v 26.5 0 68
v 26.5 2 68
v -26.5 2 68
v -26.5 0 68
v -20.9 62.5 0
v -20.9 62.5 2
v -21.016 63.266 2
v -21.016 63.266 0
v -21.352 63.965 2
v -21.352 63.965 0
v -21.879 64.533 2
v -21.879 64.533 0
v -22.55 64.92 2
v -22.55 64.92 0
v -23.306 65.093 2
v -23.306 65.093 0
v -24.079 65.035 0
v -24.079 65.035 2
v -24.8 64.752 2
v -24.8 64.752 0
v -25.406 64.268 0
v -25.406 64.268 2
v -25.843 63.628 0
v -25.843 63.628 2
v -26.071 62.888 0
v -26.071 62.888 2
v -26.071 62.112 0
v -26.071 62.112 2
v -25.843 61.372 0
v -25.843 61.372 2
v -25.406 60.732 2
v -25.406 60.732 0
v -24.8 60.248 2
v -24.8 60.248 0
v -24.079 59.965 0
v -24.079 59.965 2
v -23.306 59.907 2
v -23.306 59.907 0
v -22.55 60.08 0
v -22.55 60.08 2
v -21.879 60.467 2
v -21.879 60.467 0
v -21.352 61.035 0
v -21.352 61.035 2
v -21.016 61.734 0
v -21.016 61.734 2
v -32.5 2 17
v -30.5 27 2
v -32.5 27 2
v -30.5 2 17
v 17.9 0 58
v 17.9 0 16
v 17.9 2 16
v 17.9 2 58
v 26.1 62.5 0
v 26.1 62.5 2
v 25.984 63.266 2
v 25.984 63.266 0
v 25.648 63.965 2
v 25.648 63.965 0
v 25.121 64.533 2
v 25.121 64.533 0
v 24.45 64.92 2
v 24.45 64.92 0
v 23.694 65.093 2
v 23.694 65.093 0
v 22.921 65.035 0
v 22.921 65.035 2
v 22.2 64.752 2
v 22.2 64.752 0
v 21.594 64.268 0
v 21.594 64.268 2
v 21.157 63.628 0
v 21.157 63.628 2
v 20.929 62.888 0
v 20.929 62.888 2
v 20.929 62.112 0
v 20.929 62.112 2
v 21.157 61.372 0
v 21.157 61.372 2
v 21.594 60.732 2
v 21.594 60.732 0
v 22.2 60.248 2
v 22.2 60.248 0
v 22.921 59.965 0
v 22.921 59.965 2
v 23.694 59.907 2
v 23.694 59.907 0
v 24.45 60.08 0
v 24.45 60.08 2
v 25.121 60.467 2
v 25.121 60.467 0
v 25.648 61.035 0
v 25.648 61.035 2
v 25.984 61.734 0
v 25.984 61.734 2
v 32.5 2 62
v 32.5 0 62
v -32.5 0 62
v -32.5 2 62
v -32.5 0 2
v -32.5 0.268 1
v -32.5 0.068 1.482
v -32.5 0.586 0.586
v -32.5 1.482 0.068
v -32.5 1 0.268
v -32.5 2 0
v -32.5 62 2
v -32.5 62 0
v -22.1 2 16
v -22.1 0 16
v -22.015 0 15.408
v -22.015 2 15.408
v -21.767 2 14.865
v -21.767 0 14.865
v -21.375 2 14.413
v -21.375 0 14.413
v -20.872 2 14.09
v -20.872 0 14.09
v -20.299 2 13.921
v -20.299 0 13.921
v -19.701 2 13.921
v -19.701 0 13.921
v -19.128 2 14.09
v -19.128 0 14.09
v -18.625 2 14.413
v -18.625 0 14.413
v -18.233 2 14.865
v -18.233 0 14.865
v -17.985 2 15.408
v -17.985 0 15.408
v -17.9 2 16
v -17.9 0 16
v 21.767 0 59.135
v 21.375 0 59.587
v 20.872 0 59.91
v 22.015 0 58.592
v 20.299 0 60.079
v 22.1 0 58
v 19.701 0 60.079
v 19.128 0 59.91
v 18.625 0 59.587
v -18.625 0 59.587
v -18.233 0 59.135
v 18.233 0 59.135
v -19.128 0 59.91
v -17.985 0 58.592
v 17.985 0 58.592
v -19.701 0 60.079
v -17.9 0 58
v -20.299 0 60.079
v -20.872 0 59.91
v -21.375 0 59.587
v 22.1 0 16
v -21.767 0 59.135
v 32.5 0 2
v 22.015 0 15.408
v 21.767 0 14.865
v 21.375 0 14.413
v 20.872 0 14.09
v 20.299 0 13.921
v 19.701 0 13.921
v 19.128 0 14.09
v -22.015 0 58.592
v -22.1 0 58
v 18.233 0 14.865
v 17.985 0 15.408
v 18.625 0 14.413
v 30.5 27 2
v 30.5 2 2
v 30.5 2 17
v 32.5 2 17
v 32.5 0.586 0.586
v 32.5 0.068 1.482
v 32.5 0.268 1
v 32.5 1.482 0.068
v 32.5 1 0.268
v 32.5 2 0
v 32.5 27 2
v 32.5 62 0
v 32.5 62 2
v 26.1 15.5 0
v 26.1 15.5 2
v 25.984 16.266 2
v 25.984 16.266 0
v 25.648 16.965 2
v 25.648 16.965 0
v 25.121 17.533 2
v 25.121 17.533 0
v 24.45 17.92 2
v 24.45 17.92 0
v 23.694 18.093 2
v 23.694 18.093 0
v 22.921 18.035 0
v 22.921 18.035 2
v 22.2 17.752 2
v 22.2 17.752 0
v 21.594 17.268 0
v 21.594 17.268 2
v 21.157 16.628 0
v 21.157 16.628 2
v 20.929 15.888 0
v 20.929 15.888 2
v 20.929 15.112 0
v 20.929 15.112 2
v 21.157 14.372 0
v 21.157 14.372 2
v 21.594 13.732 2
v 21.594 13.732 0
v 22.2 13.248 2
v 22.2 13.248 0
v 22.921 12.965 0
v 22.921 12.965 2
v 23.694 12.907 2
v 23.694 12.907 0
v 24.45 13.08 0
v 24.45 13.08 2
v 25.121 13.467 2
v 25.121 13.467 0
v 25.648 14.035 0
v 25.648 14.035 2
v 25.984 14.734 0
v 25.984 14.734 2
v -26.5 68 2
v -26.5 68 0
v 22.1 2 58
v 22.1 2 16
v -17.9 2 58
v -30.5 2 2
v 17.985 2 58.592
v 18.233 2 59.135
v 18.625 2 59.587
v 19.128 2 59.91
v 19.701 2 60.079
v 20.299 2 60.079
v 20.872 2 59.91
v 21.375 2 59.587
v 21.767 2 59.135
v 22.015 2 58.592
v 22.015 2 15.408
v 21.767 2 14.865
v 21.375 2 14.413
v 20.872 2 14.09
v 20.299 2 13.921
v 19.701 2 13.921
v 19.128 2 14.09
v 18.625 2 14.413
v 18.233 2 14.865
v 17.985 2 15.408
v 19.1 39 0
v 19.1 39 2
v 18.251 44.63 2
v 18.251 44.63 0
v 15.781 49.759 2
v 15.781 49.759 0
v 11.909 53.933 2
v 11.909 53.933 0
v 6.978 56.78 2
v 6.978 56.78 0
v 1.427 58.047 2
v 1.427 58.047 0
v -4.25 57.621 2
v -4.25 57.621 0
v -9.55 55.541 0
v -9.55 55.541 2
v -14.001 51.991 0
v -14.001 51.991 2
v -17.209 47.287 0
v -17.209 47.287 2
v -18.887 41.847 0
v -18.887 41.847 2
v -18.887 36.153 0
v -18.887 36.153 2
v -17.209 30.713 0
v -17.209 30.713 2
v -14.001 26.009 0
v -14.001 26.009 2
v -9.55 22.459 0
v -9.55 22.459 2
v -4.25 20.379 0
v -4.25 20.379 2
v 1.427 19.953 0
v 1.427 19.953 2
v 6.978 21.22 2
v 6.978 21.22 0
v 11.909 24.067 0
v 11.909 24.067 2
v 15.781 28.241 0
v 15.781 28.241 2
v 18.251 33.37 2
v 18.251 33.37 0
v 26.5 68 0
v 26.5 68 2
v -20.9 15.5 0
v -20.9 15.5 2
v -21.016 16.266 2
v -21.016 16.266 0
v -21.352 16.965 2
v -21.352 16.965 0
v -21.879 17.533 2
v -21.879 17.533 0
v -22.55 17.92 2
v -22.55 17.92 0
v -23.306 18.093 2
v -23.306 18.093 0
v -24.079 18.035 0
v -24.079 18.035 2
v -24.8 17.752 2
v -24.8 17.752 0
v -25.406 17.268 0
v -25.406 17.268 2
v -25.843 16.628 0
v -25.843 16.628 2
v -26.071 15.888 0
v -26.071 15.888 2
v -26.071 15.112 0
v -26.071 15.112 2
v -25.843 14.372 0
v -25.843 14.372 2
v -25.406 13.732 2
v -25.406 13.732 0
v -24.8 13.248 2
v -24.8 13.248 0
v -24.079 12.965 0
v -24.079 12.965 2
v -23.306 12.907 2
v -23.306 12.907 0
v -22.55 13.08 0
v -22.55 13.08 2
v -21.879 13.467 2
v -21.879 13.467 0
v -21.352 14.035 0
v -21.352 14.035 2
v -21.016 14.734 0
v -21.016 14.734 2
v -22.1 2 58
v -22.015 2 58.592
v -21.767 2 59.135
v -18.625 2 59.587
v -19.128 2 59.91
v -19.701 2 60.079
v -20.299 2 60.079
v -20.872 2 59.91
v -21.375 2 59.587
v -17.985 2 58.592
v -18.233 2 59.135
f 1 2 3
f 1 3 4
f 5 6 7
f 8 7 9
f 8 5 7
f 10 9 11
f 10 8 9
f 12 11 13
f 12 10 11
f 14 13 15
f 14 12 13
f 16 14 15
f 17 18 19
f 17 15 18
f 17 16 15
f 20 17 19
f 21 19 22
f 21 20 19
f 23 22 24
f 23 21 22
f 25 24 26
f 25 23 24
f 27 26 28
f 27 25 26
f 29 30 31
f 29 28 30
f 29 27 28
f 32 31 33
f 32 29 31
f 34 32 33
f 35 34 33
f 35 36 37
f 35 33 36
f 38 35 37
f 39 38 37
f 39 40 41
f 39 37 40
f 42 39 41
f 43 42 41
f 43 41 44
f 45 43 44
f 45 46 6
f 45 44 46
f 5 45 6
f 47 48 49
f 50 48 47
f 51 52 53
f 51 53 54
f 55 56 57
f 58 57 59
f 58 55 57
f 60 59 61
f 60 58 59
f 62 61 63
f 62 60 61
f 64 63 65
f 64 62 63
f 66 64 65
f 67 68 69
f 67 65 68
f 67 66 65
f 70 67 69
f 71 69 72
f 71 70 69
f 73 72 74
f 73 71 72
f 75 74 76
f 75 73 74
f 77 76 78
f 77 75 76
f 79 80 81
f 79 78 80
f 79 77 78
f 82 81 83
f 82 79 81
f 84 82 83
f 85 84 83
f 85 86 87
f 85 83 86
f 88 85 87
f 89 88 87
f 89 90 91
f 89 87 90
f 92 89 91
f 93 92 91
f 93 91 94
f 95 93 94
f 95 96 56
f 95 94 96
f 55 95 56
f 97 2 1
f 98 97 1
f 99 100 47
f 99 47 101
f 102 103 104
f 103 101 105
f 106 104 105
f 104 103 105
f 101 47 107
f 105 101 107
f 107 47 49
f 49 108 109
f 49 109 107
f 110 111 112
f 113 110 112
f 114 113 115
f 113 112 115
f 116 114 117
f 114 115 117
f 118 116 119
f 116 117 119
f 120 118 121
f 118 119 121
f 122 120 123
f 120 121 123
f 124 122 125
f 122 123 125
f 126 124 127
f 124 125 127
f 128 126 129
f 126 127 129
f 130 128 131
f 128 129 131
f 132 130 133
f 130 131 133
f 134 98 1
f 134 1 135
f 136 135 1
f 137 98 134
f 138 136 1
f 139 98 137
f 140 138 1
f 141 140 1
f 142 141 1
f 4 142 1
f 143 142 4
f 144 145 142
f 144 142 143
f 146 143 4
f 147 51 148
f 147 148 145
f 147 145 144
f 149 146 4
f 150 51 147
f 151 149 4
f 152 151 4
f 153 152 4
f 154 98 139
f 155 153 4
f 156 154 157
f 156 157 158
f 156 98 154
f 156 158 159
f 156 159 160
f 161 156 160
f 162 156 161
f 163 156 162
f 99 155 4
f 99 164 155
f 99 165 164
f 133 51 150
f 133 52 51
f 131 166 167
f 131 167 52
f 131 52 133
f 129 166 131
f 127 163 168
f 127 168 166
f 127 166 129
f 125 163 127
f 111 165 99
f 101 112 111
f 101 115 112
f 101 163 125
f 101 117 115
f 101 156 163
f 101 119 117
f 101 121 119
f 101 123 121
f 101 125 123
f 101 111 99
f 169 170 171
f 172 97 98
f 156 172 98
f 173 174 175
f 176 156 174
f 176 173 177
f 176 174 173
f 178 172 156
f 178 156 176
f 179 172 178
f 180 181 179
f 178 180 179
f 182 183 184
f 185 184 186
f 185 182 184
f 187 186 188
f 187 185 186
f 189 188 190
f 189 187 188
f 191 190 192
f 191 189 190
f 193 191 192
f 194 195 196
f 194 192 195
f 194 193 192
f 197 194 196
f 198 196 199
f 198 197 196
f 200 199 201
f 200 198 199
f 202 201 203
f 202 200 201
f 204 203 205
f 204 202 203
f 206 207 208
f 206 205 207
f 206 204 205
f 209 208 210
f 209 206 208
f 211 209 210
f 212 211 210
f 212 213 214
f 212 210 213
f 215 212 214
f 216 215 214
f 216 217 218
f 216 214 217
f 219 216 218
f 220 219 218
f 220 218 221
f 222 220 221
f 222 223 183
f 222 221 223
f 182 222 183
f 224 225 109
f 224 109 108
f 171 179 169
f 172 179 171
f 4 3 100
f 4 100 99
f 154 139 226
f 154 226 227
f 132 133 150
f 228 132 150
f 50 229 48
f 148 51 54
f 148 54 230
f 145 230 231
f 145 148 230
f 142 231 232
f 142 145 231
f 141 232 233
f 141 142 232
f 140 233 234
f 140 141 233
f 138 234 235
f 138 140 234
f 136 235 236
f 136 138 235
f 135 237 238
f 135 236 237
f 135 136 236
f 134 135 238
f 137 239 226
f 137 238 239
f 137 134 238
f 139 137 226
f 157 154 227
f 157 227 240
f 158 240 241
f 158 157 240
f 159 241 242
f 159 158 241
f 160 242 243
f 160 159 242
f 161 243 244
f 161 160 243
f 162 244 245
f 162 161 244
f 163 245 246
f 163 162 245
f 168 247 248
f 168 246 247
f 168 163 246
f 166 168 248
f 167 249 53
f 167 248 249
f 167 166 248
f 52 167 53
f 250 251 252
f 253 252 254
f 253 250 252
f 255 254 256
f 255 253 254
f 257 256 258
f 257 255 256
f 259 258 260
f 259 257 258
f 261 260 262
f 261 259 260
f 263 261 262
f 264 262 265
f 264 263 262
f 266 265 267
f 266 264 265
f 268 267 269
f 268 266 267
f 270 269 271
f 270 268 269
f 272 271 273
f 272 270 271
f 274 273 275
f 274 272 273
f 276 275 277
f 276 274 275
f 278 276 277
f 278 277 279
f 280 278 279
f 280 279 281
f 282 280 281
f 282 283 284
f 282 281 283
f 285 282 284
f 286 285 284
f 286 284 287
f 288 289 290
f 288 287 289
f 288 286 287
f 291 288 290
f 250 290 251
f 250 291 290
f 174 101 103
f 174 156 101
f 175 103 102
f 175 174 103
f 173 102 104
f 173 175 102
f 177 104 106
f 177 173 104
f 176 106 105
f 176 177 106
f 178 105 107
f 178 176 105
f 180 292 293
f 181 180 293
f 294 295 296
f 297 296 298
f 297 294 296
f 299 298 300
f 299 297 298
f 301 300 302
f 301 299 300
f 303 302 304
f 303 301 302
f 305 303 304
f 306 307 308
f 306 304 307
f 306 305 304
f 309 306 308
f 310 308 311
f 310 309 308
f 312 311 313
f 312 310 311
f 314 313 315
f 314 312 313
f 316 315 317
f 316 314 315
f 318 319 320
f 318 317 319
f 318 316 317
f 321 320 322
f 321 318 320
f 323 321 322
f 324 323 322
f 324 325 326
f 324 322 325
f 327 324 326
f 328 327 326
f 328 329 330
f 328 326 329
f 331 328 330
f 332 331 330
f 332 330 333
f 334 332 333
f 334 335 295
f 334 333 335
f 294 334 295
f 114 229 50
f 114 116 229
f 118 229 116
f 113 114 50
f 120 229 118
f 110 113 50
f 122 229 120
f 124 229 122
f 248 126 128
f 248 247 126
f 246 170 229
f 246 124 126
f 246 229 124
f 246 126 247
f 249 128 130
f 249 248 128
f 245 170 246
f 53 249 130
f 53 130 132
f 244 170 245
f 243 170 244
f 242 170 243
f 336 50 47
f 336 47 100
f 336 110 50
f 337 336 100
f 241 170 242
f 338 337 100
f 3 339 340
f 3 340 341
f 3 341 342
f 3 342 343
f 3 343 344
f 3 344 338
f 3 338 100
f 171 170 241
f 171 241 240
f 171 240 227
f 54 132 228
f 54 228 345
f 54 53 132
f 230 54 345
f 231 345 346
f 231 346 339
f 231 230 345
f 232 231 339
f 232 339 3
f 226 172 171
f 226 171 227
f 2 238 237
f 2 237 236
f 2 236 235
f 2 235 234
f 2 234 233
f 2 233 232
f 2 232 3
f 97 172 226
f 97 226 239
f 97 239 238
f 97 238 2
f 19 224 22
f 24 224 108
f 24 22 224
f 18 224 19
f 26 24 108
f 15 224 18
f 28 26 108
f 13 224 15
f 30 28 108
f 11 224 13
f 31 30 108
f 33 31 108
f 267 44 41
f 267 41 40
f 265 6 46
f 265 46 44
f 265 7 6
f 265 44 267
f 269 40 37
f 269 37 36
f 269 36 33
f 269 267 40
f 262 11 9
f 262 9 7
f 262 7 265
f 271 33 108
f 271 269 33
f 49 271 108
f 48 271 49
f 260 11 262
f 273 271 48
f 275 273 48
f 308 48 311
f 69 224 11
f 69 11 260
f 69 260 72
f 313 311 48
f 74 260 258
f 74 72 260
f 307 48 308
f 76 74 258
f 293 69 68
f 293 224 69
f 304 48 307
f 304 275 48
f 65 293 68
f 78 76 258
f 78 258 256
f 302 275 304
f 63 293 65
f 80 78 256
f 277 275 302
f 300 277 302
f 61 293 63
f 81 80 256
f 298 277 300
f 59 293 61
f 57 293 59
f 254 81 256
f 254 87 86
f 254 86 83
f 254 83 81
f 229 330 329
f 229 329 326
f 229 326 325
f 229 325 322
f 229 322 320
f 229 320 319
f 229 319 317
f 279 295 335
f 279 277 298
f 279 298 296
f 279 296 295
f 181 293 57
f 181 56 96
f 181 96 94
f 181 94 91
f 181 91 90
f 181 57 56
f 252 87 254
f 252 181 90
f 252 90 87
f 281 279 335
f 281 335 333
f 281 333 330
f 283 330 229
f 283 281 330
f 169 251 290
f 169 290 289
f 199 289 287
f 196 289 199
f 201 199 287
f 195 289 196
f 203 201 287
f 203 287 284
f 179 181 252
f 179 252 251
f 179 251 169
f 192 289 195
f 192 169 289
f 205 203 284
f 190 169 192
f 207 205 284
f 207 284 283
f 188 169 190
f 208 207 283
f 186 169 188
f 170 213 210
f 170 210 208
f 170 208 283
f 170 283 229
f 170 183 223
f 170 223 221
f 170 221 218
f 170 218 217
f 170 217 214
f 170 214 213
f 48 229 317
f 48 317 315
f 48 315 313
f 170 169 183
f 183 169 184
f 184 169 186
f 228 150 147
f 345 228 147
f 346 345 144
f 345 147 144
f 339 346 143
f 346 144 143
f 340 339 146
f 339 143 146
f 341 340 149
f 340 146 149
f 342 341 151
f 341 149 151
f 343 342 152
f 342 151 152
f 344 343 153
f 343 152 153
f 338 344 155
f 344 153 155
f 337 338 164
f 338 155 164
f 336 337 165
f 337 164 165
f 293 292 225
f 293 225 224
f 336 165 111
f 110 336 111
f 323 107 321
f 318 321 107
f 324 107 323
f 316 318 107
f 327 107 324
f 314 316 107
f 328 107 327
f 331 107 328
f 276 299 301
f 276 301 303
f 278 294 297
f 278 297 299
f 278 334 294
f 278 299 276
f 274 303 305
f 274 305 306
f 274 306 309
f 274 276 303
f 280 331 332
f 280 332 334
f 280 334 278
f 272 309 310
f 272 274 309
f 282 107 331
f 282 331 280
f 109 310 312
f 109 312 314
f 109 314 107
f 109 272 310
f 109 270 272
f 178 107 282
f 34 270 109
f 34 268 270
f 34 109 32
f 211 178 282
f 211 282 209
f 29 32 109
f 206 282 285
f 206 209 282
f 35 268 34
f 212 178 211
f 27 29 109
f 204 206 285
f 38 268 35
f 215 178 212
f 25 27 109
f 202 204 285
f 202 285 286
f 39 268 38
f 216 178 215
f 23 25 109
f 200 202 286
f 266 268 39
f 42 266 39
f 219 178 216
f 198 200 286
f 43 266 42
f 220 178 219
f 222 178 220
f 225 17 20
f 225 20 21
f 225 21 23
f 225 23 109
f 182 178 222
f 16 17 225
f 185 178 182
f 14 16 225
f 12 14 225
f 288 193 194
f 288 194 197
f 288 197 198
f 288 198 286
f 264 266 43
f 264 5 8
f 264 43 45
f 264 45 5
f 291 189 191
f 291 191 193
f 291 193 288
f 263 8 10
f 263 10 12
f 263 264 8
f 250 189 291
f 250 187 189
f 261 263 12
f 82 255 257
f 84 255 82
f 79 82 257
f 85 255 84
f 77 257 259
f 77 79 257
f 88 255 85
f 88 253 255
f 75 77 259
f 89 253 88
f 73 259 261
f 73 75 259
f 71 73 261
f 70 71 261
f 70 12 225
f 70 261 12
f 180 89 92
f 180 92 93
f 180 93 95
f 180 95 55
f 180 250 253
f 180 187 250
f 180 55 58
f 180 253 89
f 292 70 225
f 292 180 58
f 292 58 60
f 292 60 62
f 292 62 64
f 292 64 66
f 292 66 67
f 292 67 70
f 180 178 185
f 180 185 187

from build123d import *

# Parameters (mm, degrees)
EXTRUDE_1_DEPTH      = 32.5
CUT_EXTRUDE_3_DEPTH  = 30.5
EXTRUDE_2_DEPTH      = 68
CUT_EXTRUDE_8_DEPTH  = 69
SKETCH_11_R          = 19.1
SKETCH_11_R_2        = 2.6
CUT_EXTRUDE_10_DEPTH = 69
CHAMFER_1_SIZE       = 6
CHAMFER_2_SIZE       = 6
CHAMFER_3_SIZE       = 6
CHAMFER_4_SIZE       = 6
FILLET_1_R           = 2


with BuildPart() as part:
    # 草图1 → 凸台-拉伸1 (new body, symmetric)
    with BuildSketch(Plane(origin=(0, 0, 0), x_dir=(0, 0, -1), z_dir=(1, 0, 0))):
        Polygon((-68, 0), (0, 0), (0, 68), (-2, 68), (-2, 27), (-17, 2), (-68, 2), align=None)
    extrude(amount=EXTRUDE_1_DEPTH, both=True)

    # 草图6 → 切除-拉伸3 (cut, symmetric)
    with BuildSketch(Plane(origin=(0, 0, 0), x_dir=(0, 0, -1), z_dir=(1, 0, 0))):
        Polygon((-17, 2), (-2, 27), (-2, 2), align=None)
    extrude(amount=CUT_EXTRUDE_3_DEPTH, both=True, mode=Mode.SUBTRACT)

    # 草图7 → 凸台-拉伸2 (add, through all)
    with BuildSketch(Plane(origin=(0, 0, 0), x_dir=(1, 0, 0), z_dir=(0, 1, 0))):
        with BuildLine():
            Line((-17.9, -16), (-17.9, -58))
            ThreePointArc((-17.9, -58), (-20, -60.1), (-22.1, -58))
            Line((-22.1, -58), (-22.1, -16))
            ThreePointArc((-22.1, -16), (-20, -13.9), (-17.9, -16))
        make_face()
        with BuildLine():
            Line((17.9, -16), (17.9, -58))
            ThreePointArc((17.9, -58), (20, -60.1), (22.1, -58))
            Line((22.1, -58), (22.1, -16))
            ThreePointArc((22.1, -16), (20, -13.9), (17.9, -16))
        make_face()
    extrude(amount=EXTRUDE_2_DEPTH)

    # 草图10 → 切除-拉伸8 (cut, through all)
    with BuildSketch(Plane(origin=(0, 0, 0), x_dir=(1, 0, 0), z_dir=(0, 1, 0))):
        with BuildLine():
            Line((-17.9, -16), (-17.9, -58))
            ThreePointArc((-17.9, -58), (-20, -60.1), (-22.1, -58))
            Line((-22.1, -58), (-22.1, -16))
            ThreePointArc((-22.1, -16), (-20, -13.9), (-17.9, -16))
        make_face()
        with BuildLine():
            Line((17.9, -16), (17.9, -58))
            ThreePointArc((17.9, -58), (20, -60.1), (22.1, -58))
            Line((22.1, -58), (22.1, -16))
            ThreePointArc((22.1, -16), (20, -13.9), (17.9, -16))
        make_face()
    extrude(amount=CUT_EXTRUDE_8_DEPTH, mode=Mode.SUBTRACT)

    # 草图11 → 切除-拉伸10 (cut, through all)
    with BuildSketch(Plane.XY):
        with Locations((0, 39)):
            Circle(SKETCH_11_R)
        with Locations((-23.5, 62.5)):
            Circle(SKETCH_11_R_2)
        with Locations((23.5, 62.5)):
            Circle(SKETCH_11_R_2)
        with Locations((23.5, 15.5)):
            Circle(SKETCH_11_R_2)
        with Locations((-23.5, 15.5)):
            Circle(SKETCH_11_R_2)
    extrude(amount=CUT_EXTRUDE_10_DEPTH, mode=Mode.SUBTRACT)

    # 倒角1
    chamfer_1_edges = [part.edges().sort_by_distance(p)[0] for p in [
        (-32.5, 68, 1),
    ]]
    chamfer(chamfer_1_edges, length=CHAMFER_1_SIZE)

    # 倒角2
    chamfer_2_edges = [part.edges().sort_by_distance(p)[0] for p in [
        (32.5, 68, 1),
    ]]
    chamfer(chamfer_2_edges, length=CHAMFER_2_SIZE)

    # 倒角3
    chamfer_3_edges = [part.edges().sort_by_distance(p)[0] for p in [
        (-32.5, 1, 68),
    ]]
    chamfer(chamfer_3_edges, length=CHAMFER_3_SIZE)

    # 倒角4
    chamfer_4_edges = [part.edges().sort_by_distance(p)[0] for p in [
        (32.5, 1, 68),
    ]]
    chamfer(chamfer_4_edges, length=CHAMFER_4_SIZE)

    # 圆角1
    fillet_1_edges = [part.edges().sort_by_distance(p)[0] for p in [
        (0, 0, 0),
    ]]
    fillet(fillet_1_edges, radius=FILLET_1_R)


solid = part.part
